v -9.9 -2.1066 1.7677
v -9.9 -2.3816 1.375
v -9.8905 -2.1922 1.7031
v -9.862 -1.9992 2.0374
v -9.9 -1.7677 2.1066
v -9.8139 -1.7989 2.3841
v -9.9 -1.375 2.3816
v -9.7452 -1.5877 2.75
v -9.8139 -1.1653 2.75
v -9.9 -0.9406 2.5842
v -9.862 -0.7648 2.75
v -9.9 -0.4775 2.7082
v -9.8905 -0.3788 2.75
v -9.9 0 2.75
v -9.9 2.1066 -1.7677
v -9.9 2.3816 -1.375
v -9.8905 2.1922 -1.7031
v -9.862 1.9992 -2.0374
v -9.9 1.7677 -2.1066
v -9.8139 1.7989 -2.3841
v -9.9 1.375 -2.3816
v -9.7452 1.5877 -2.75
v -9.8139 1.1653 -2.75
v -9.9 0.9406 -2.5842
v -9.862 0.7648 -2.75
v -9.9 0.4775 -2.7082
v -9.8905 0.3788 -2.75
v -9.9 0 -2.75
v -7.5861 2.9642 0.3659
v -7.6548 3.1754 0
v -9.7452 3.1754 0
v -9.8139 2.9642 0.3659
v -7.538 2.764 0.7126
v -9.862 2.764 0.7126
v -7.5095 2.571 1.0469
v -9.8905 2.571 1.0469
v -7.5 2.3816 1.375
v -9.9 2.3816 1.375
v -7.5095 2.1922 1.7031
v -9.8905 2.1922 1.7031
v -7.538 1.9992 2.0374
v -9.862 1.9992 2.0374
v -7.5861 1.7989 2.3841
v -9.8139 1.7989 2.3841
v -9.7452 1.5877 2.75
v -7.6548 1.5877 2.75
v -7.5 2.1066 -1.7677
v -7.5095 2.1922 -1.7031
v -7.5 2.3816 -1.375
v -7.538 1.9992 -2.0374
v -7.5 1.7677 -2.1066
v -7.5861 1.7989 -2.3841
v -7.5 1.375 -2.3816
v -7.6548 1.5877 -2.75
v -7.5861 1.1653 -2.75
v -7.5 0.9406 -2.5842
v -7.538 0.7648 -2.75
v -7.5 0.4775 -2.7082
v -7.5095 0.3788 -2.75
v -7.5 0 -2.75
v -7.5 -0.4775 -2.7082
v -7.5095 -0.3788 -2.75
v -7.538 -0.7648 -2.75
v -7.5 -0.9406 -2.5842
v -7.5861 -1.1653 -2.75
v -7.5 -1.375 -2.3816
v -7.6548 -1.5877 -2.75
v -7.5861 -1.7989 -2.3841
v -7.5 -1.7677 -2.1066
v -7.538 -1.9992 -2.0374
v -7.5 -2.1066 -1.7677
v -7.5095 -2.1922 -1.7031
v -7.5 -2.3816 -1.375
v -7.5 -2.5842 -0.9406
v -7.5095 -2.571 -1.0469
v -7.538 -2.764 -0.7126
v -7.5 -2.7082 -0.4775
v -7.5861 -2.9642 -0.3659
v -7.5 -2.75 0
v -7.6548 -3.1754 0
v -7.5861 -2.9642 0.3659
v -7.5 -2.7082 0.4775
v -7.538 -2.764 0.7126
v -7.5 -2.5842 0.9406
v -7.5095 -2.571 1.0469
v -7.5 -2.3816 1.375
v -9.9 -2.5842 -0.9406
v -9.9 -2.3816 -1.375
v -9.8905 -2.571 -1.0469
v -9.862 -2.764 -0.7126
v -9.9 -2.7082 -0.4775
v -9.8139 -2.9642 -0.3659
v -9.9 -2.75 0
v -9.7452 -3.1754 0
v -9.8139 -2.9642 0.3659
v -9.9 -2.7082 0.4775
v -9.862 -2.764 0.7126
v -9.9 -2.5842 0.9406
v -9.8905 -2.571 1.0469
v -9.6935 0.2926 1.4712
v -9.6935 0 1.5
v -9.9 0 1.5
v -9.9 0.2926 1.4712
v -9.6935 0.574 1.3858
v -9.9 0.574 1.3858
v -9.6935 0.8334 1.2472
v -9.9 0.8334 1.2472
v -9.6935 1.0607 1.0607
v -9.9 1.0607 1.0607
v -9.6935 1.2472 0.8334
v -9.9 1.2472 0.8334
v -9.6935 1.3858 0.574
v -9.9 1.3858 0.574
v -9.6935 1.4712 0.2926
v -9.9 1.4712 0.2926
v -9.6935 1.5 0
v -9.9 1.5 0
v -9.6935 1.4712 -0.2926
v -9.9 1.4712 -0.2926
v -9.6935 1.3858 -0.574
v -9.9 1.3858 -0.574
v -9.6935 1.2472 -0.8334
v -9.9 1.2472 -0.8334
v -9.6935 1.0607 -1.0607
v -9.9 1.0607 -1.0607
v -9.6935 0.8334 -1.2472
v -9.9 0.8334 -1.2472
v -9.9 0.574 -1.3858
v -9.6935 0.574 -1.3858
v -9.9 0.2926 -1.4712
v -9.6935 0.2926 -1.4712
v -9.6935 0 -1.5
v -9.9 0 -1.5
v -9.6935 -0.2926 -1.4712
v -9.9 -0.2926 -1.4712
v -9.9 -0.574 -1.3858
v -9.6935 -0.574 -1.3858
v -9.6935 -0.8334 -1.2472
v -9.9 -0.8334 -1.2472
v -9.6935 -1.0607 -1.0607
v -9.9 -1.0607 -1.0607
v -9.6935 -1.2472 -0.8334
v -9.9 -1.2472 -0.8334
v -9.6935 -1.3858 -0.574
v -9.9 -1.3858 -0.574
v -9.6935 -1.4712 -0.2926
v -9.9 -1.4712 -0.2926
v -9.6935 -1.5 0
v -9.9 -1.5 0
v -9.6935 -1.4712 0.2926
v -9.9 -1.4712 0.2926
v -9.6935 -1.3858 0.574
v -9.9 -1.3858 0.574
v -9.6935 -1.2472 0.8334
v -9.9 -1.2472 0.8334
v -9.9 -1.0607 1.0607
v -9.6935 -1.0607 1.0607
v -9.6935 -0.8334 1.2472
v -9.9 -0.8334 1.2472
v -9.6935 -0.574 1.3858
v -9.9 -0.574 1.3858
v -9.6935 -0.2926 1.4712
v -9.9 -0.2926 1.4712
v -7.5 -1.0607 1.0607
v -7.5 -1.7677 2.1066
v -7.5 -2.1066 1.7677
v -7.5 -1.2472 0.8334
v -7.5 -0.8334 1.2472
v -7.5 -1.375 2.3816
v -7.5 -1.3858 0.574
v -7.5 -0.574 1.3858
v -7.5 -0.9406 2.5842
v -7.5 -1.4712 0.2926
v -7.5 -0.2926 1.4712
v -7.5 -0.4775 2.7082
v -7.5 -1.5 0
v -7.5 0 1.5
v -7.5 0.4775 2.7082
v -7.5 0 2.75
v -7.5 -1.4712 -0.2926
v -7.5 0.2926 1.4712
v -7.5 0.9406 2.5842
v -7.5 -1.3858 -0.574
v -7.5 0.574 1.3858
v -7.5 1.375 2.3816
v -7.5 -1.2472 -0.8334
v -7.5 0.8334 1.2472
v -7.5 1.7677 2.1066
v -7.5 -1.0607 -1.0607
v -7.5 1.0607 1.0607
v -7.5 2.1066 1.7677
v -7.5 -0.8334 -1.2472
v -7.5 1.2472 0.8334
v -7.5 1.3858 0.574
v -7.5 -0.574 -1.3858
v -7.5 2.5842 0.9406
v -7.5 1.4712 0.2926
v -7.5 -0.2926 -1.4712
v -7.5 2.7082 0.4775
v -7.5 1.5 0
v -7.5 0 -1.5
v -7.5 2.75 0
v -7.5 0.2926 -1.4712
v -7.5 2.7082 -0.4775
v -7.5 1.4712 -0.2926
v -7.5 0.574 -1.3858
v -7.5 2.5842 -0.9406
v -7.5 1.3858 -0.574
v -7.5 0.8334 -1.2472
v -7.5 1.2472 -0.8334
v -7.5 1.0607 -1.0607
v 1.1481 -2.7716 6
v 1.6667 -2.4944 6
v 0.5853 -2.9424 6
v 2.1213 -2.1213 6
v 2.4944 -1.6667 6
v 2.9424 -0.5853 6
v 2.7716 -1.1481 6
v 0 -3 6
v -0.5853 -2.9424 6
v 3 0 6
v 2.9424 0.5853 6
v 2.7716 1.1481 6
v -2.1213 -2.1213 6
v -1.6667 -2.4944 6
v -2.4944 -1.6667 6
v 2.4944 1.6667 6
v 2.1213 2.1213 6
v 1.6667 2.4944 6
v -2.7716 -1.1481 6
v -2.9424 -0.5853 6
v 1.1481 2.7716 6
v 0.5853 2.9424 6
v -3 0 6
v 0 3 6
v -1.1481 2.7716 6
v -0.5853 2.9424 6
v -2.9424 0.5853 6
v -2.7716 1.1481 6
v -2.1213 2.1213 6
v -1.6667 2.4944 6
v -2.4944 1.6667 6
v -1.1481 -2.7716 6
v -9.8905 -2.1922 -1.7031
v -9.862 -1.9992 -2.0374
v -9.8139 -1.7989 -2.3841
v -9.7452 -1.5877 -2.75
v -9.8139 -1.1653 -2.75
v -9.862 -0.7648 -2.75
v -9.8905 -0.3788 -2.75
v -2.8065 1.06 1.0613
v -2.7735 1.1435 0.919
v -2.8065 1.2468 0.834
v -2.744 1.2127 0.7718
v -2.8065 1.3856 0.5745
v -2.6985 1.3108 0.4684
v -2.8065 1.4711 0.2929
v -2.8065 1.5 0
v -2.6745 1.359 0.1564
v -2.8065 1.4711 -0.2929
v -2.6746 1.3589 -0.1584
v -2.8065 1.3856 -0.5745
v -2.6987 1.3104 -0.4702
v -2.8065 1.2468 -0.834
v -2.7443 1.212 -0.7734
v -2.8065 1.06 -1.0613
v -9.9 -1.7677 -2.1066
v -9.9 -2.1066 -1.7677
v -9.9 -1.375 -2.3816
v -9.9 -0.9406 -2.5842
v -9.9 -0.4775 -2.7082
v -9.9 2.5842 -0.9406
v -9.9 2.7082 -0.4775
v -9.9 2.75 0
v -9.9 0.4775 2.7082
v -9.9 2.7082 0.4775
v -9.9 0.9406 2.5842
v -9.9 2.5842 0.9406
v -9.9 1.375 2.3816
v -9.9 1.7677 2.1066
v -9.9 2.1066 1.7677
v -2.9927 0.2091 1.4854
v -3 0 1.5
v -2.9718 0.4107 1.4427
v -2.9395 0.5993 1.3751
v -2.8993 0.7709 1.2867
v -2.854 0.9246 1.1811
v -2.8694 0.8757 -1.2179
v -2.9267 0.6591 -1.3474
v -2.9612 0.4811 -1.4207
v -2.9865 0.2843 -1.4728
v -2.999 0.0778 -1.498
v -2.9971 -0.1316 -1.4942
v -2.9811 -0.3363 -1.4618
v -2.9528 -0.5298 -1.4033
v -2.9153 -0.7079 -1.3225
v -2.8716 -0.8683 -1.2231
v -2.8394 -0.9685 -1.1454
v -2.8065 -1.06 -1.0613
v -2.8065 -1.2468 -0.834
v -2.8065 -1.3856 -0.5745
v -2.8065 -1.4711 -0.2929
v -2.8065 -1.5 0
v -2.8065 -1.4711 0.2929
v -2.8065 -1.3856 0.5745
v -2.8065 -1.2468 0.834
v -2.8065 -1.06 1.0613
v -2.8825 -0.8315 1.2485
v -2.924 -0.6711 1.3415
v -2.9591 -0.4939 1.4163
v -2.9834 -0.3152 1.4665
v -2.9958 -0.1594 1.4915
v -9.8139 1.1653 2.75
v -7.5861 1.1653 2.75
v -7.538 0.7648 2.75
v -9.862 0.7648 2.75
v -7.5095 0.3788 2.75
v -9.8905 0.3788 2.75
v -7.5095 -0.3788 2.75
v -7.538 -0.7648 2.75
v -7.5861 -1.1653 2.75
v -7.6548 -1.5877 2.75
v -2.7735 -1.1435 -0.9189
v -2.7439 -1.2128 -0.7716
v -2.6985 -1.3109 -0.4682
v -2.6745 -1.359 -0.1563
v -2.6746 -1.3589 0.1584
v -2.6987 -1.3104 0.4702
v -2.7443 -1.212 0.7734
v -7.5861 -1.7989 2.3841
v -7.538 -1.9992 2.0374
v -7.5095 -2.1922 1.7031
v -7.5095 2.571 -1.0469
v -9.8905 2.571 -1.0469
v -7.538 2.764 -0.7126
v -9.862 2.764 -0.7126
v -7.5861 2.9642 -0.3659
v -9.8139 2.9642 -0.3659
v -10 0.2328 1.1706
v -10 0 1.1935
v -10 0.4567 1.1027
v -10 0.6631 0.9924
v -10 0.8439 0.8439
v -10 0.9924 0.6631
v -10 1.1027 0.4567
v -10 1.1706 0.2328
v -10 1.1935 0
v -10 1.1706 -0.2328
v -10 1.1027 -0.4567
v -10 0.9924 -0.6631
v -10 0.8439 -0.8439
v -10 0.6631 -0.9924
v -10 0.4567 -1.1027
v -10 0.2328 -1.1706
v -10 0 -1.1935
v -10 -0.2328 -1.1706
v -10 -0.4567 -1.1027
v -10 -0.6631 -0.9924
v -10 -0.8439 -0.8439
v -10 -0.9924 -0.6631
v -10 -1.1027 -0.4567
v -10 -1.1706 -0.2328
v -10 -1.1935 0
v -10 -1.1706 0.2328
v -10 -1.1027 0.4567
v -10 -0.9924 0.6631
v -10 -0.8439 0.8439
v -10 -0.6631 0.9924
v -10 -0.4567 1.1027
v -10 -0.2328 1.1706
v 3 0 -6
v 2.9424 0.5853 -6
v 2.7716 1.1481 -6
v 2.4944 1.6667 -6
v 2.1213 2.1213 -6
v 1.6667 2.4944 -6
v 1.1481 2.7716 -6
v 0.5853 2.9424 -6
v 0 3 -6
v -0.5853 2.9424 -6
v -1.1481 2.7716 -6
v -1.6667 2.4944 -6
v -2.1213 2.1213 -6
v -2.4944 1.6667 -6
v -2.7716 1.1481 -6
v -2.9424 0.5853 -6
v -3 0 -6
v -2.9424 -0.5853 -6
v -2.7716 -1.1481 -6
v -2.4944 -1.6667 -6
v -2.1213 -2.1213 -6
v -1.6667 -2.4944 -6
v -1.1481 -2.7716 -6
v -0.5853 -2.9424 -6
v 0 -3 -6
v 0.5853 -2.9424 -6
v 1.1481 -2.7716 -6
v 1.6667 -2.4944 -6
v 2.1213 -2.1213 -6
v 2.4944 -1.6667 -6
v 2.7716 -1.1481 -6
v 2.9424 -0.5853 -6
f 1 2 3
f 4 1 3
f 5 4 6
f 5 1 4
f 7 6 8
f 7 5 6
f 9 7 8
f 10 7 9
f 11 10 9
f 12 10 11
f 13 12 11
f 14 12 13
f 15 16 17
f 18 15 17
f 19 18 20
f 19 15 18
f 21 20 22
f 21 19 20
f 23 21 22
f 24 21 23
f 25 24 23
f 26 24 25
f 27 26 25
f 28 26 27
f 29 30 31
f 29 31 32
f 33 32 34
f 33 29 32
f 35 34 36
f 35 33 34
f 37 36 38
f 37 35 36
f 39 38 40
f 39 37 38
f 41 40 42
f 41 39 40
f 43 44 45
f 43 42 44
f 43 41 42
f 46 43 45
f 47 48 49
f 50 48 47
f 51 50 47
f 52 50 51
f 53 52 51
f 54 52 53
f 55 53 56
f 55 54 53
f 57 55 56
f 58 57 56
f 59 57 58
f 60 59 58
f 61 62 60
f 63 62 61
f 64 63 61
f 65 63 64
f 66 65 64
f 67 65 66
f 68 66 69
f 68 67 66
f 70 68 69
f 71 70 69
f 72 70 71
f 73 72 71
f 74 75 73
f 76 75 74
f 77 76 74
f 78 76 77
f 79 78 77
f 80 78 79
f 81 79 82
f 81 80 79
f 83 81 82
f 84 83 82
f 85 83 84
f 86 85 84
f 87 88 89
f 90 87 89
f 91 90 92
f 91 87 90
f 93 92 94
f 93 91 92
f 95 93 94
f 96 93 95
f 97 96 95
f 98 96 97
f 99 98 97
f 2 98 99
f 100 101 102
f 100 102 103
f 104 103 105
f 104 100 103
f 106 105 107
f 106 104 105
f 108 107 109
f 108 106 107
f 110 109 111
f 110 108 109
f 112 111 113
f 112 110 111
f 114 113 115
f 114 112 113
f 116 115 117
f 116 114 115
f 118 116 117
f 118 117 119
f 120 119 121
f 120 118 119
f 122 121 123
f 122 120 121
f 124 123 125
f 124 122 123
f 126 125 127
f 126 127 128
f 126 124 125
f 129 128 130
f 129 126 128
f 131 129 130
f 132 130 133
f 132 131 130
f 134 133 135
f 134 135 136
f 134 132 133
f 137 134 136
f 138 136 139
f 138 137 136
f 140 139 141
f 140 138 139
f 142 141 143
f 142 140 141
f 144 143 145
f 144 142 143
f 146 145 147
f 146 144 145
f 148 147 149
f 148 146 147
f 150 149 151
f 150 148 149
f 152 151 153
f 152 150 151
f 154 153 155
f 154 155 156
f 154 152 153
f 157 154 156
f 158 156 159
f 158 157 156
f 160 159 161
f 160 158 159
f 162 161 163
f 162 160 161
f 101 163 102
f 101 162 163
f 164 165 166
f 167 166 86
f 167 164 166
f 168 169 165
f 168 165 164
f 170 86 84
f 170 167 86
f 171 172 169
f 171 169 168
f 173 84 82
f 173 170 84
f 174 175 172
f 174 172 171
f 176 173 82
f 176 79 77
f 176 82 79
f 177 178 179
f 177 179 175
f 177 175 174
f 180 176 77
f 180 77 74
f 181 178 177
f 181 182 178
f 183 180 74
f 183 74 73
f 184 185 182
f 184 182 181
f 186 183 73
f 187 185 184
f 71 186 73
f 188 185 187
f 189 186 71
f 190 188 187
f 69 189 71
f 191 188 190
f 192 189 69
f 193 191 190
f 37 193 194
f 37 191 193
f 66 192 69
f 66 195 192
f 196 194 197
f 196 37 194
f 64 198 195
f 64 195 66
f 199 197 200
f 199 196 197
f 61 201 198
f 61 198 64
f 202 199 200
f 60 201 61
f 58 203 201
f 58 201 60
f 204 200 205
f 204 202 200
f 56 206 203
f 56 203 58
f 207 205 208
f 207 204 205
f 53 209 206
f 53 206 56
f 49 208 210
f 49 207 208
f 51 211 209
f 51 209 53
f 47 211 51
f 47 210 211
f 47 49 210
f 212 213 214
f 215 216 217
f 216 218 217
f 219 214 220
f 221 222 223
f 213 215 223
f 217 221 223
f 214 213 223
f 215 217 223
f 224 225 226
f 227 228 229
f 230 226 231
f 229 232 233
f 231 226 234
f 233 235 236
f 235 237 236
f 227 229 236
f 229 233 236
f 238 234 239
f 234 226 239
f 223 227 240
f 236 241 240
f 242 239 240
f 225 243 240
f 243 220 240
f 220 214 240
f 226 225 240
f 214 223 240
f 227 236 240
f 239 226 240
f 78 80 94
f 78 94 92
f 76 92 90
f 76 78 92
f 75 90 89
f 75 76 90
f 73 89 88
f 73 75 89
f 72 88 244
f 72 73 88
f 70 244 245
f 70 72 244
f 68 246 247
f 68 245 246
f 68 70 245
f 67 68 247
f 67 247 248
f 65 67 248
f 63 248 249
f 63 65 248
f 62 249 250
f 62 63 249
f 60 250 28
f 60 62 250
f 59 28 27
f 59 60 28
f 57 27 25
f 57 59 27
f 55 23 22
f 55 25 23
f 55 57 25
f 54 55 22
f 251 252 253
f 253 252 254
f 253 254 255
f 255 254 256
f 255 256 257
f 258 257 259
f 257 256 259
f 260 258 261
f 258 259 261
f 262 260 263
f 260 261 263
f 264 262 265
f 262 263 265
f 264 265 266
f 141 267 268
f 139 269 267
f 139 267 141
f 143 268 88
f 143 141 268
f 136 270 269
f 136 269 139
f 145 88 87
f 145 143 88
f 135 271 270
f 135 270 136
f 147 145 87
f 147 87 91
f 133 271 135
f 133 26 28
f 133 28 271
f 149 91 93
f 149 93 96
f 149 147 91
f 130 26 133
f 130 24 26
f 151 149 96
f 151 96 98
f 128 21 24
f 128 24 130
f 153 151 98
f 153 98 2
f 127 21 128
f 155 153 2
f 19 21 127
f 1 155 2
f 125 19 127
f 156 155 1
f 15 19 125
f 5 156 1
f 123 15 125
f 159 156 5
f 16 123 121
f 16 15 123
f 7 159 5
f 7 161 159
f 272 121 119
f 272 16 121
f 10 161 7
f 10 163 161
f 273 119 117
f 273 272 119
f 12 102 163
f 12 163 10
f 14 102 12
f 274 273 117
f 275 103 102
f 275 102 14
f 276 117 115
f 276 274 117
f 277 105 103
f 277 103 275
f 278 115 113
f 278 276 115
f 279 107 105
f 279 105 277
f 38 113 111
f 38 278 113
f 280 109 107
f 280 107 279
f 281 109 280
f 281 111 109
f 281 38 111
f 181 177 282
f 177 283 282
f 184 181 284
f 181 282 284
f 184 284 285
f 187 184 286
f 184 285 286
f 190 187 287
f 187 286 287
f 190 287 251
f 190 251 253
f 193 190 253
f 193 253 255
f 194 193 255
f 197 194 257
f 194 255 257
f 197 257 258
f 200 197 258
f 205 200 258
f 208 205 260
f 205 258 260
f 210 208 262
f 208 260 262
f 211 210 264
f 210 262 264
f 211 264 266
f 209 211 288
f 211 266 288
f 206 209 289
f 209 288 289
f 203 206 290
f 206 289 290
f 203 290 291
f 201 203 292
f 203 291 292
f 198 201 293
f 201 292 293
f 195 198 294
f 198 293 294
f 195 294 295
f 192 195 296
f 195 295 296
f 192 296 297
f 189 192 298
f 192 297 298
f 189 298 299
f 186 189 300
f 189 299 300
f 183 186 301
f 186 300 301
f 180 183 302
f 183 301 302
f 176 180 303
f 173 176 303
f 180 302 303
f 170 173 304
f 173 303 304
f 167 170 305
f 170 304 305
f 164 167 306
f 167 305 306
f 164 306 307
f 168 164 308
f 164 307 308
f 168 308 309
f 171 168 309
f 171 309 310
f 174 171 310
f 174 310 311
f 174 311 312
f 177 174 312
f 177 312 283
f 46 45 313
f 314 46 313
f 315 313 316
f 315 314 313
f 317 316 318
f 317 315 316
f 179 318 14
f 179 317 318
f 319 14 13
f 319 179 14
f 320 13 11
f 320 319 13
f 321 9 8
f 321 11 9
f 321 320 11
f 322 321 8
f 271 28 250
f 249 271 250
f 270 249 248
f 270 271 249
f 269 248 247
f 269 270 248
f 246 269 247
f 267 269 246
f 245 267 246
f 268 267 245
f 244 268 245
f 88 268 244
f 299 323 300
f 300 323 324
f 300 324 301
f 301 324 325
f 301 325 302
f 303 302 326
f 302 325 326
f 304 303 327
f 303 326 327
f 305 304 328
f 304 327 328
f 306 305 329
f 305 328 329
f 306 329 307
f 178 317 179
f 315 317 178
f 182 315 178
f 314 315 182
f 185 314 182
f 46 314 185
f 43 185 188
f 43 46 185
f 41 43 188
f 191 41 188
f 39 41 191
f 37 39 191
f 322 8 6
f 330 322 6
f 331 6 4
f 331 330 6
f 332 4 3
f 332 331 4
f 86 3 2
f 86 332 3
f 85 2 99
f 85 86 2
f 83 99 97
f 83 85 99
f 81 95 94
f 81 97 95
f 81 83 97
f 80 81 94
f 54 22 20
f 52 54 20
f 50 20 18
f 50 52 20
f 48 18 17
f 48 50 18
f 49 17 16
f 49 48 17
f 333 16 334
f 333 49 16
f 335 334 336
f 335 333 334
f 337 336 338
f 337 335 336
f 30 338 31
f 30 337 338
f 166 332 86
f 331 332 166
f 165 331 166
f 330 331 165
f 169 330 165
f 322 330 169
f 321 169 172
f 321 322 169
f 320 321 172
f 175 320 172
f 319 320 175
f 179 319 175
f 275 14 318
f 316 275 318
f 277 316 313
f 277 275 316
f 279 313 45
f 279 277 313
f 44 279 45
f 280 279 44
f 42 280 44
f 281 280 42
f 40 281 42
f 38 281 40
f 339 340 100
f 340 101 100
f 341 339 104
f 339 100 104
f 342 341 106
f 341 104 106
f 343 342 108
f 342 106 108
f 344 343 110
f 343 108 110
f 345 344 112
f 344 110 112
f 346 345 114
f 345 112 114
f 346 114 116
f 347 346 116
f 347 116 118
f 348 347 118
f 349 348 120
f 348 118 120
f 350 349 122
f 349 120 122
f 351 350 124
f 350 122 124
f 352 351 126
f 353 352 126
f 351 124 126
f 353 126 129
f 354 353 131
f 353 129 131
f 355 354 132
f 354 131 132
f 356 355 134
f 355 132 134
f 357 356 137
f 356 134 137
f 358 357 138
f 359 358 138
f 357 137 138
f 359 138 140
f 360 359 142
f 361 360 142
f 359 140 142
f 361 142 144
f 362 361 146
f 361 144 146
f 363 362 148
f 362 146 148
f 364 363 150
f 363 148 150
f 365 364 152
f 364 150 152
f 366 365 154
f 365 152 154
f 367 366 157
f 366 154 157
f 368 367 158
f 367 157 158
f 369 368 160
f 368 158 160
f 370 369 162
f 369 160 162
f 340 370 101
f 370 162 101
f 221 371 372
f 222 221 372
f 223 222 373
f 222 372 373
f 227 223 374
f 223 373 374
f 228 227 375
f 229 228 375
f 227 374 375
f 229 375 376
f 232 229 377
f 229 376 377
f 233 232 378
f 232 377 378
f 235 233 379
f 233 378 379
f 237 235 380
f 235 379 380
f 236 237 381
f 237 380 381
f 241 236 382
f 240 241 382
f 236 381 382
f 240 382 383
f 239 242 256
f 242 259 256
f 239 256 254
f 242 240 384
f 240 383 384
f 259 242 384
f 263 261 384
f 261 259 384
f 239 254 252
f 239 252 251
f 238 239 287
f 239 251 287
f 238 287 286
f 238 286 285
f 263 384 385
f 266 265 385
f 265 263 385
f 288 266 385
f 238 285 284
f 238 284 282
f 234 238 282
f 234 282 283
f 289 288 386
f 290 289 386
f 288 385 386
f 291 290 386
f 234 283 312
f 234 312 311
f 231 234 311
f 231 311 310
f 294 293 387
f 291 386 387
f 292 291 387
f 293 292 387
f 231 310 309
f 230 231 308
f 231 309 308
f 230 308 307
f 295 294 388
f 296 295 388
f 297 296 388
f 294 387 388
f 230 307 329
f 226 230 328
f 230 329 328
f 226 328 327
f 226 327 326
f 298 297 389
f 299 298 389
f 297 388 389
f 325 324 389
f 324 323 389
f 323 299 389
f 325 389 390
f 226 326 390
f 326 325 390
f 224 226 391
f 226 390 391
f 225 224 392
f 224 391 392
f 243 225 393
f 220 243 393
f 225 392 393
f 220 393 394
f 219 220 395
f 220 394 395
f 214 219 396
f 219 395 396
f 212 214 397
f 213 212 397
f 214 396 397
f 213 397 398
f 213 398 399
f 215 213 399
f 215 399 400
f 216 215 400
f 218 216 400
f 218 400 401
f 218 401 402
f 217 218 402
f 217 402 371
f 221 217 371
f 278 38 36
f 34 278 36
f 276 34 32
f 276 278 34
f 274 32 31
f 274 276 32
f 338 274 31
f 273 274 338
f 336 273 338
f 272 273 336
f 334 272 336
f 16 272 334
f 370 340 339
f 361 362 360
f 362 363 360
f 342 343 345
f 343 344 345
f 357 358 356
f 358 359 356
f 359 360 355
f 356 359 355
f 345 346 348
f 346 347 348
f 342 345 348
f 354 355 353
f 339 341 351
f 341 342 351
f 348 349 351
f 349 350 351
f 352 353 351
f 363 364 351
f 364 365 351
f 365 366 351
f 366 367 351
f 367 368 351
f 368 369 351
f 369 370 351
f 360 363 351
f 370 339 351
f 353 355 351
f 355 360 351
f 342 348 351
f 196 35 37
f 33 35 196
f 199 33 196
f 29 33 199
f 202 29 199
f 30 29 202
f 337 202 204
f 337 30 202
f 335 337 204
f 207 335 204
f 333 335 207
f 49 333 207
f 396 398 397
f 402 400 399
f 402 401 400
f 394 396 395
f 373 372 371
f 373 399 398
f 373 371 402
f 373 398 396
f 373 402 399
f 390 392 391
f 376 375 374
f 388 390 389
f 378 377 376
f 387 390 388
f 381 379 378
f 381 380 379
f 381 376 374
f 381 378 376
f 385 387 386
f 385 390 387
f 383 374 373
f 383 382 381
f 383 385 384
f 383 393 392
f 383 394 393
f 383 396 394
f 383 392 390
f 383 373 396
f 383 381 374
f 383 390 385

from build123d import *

# Parameters (mm, degrees)
SKETCH1_W          = 12
SKETCH1_H          = 3
SKETCH4_W          = 11
SKETCH4_H          = 11
CUT_EXTRUDE1_DEPTH = 2.4


with BuildPart() as part:
    # Sketch1 → Revolve1 (revolve)
    with BuildSketch(Plane(origin=(0, 0, 0), x_dir=(0, 0, -1), z_dir=(1, 0, 0)), mode=Mode.PRIVATE) as revolve1_sk:
        with Locations((0, 1.5)):
            Rectangle(SKETCH1_W, SKETCH1_H)
    revolve(revolve1_sk.sketch.rotate(Axis((0, 0, -6), (0, 0, 1)), 270), axis=Axis((0, 0, -6), (0, 0, 1)))

    # Sketch2 → Revolve2 (revolve)
    with BuildSketch(Plane.XY, mode=Mode.PRIVATE) as revolve2_sk:
        Polygon((-10, 0), (-10, 1.1935), (-9.6935, 1.5), (-2.8065, 1.5), (-2.5, 1.1935), (-2.5, 0), align=None)
    revolve(revolve2_sk.sketch.rotate(Axis((-2.5, 0, 0), (-1, 0, 0)), 270), axis=Axis((-2.5, 0, 0), (-1, 0, 0)))

    # Sketch3 → Revolve3 (revolve)
    with BuildSketch(Plane.XY, mode=Mode.PRIVATE) as revolve3_sk:
        Polygon((-9.9, 2.75), (-9.9, 1.5), (-7.5, 1.5), (-7.5, 2.75), (-7.654842576, 3.175426481), (-9.745157424, 3.175426481), align=None)
    revolve(revolve3_sk.sketch.rotate(Axis((42.5, 0, 0), (-1, 0, 0)), 270), axis=Axis((42.5, 0, 0), (-1, 0, 0)))

    # Sketch4 → Cut-Extrude1 (cut)
    with BuildSketch(Plane(origin=(-7.5, 0, 0), x_dir=(0, 0, -1), z_dir=(1, 0, 0))):
        Rectangle(SKETCH4_W, SKETCH4_H)
        Polygon((-2.75, -1.58771324), (0, -3.175426481), (2.75, -1.58771324), (2.75, 1.58771324), (0, 3.175426481), (-2.75, 1.58771324), align=None, mode=Mode.SUBTRACT)
    extrude(amount=-CUT_EXTRUDE1_DEPTH, mode=Mode.SUBTRACT)


solid = part.part
